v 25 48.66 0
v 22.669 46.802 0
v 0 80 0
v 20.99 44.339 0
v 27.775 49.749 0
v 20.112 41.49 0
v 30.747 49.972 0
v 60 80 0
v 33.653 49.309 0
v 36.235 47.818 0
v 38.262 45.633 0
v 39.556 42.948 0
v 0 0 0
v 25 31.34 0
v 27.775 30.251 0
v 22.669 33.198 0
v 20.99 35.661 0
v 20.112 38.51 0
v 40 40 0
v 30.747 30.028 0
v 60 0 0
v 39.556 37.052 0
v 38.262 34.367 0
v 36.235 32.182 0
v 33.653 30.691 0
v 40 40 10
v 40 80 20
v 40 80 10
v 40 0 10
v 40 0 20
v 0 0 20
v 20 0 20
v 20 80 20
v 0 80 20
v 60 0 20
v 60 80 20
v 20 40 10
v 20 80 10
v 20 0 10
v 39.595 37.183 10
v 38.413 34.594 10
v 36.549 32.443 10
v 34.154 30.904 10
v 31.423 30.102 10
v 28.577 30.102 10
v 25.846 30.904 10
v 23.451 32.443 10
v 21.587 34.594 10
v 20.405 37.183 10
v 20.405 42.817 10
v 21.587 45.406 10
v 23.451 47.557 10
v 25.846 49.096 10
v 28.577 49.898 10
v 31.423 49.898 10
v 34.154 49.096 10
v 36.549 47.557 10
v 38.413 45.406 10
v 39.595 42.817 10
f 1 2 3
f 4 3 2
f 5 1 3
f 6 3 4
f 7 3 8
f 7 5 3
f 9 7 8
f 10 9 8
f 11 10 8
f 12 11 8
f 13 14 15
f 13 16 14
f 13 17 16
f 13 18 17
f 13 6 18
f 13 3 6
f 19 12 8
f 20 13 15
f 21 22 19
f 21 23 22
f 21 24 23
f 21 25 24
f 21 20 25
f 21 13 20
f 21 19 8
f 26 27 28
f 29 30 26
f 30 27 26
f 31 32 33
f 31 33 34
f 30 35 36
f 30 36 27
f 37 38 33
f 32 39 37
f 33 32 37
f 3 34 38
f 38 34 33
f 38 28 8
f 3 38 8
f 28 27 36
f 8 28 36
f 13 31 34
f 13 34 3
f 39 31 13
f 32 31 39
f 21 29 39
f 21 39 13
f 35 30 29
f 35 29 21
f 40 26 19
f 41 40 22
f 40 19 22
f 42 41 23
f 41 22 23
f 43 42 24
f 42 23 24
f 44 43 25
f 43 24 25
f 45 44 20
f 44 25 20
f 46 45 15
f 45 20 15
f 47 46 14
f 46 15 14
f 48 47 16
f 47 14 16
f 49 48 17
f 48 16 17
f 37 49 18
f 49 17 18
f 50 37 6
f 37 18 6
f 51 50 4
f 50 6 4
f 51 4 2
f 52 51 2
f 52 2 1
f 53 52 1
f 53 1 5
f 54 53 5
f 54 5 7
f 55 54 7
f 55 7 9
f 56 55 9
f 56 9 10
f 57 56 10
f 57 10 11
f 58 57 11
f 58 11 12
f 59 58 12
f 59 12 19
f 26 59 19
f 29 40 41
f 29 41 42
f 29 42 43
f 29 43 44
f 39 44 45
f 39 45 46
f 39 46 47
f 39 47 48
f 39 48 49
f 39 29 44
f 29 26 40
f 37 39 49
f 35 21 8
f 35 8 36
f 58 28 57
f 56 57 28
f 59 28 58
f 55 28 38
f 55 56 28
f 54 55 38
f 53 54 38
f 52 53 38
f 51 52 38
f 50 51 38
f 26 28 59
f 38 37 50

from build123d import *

# Parameters (mm, degrees)
F1_DEPTH = 80
F2_R     = 10
F3_DEPTH = 20


with BuildPart() as f1:
    # F0 (on Front) → F1 (new body)
    with BuildSketch(Plane.XZ):
        Polygon((0, 20), (0, 0), (60, 0), (60, 20), (40, 20), (40, 10), (20, 10), (20, 20), align=None)
    extrude(amount=-F1_DEPTH)

    # F2 (on face) → F3 (cut)
    with BuildSketch(Plane(origin=(0, 0, 0), x_dir=(1, 0, 0), z_dir=(0, 0, -1))):
        with Locations((30, -40)):
            Circle(F2_R)
    extrude(amount=-F3_DEPTH, mode=Mode.SUBTRACT)


solid = f1.part
